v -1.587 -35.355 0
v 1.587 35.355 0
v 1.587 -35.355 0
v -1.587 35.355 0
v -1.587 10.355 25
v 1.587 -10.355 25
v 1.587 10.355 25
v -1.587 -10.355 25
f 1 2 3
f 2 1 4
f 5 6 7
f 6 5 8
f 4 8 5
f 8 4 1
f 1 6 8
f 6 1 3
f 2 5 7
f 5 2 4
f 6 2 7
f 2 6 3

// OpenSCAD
$fn = 72;



steelColor = [224/255, 223/255, 219/255];



edgeThickness = 3.175;
width = 120;
height = 366.67;
grillHeight = 73.33;
lensOffset = 153.33;
labelOffset = height - (edgeThickness + 8);
plateThickness = 3;
thickness = 75;
plateOffset = thickness - 5;
nozzleFudge = 0.4;


//translate([0, lensOffset, plateOffset + plateThickness + 3])
//button();

/*
translate([0, edgeThickness, plateOffset])
grill();
*/

/*
intersection()
{
    difference()
    {
        translate([0, grillHeight + (edgeThickness * 2), plateOffset])
        plate();
        
        union()
        {
            translate([0, lensOffset, 6.25])
            buttonMask();
            
            translate([0, labelOffset, plateOffset + plateThickness])
            label();
        }
    }
    
    translate([0, 80 + edgeThickness*2 + grillHeight + 140, 0])
    cube([200, 160, 200], center=true);
}
*/

//translate([0, labelOffset, plateOffset + plateThickness])
//label();

/*
translate([0, edgeThickness/2, 0])
difference()
{
    edgeWidth = width - (edgeThickness * 2);
    supportHeight = plateOffset + nozzleFudge;
    
    rotate([90, 0, 0])
    horizontalEdge(holeWidth = 16);
    
    union()
    {
        translate([-(edgeThickness + nozzleFudge)/2 + edgeWidth/2, -supportHeight/2, edgeThickness/2 - nozzleFudge*1.5/2])
        cube([edgeThickness + nozzleFudge, supportHeight, nozzleFudge*1.5 + .01], center=true);
        
        translate([-(-(edgeThickness + nozzleFudge)/2 + edgeWidth/2), -supportHeight/2, edgeThickness/2 - nozzleFudge*1.5/2])
        cube([edgeThickness + nozzleFudge, supportHeight, nozzleFudge*1.5 + .01], center=true);
        
        
        translate([-(-(edgeThickness + nozzleFudge)/2 + edgeWidth/2), -supportHeight/2, -edgeThickness/2 + nozzleFudge/2])
        cube([edgeThickness + nozzleFudge, supportHeight, nozzleFudge], center=true);
        
        translate([(-(edgeThickness + nozzleFudge)/2 + edgeWidth/2), -supportHeight/2, -edgeThickness/2 + nozzleFudge/2])
        cube([edgeThickness + nozzleFudge, supportHeight, nozzleFudge], center=true);
        
        
    }
}
*/

//translate([0, 3*edgeThickness/2 + grillHeight, 0])
//horizontalEdge();
//translate([0, height - edgeThickness/2, 0])
//horizontalEdge();

/*
intersection()
{
    union()
    {
        translate([-(width/2 - edgeThickness/2), height/2, 0])
        verticalEdge();

        mirror()
        {
            translate([-(width/2 - edgeThickness/2), height/2, 0])
            verticalEdge();
        }
    }
    
    translate([0, 375, 0])
    cube([200, 150, 200], center=true);
}
*/

corner();
module corner()
{
    difference()
    {
        rotate([45, 0, 0])
        cube([edgeThickness, 50, 50], center=true);
        
        union()
        {
            translate([0, 0, -50])
            cube([100, 100, 100], center=true);
            
            translate([0, 0, 50 + 25])
            cube([100, 100, 100], center=true);
        }
    }
}


module button()
{
    buttonDiameter = 87.8;
    bezelStartDiameter = 98.5;
    bezelEndDiameter = 92;
    bezelHeight = 6.5;
    
    union()
    {
        color("black")
        cylinder(d=buttonDiameter, h=10, center=true);
        
        scale([1, 1, .5])
        difference()
        {
            color("red")
            sphere(d=buttonDiameter, center=true);
            
            translate([0, 0, -75])
            cube([150, 150, 150], center=true);
        }
        
        cylinder(d1=bezelStartDiameter, d2=bezelEndDiameter, h=bezelHeight, center=true);
    }
}

module buttonMask()
{
    buttonDiameter = 87.8;
    notchRadius = 3;
    cylinder(d=buttonDiameter + nozzleFudge, h=50, center=true);
    
    translate([0, buttonDiameter/2, 0])
    cylinder(r=notchRadius + nozzleFudge, h=50, center=true);
    
    translate([0, -buttonDiameter/2, 0])
    cylinder(r=notchRadius + nozzleFudge, h=50, center=true);
}

module horizontalEdge(holeWidth)
{
    edgeWidth = width - (edgeThickness * 2);
    edgeLength = edgeThickness;
    edgeHeight = thickness;
    
    color(steelColor)
    translate([0, 0, edgeHeight/2])
    difference()
    {
        cube([edgeWidth, edgeLength, edgeHeight], center=true);
        
        rotate([90, 0, 0])
        cylinder(d=holeWidth, h=edgeThickness*2, center=true);
    }
}

module verticalEdge()
{
    edgeWidth = edgeThickness;
    edgeLength = height;
    edgeHeight = thickness;
    
    supportHeight = plateOffset;
    
    color(steelColor)
    translate([0, 0, edgeHeight/2])
    cube([edgeWidth, edgeLength, edgeHeight], center=true);
        
    // Supports for assembly
    translate([edgeThickness, 3*edgeThickness/2 - edgeLength/2, supportHeight/2])
    cube([edgeThickness, edgeThickness, supportHeight], center=true);
    
    translate([edgeThickness, edgeThickness/2 - edgeLength/2 + grillHeight, supportHeight/2])
    cube([edgeThickness, edgeThickness, supportHeight], center=true);
    
    translate([edgeThickness, 5*edgeThickness/2 - edgeLength/2 + grillHeight, supportHeight/2])
    cube([edgeThickness, edgeThickness, supportHeight], center=true);
    
    translate([edgeThickness, 0, supportHeight/2])
    cube([edgeThickness, edgeThickness, supportHeight], center=true);
    
    translate([edgeThickness, edgeLength/4, supportHeight/2])
    cube([edgeThickness, edgeThickness, supportHeight], center=true);
    
    translate([edgeThickness, -3*edgeThickness/2 + edgeLength/2, supportHeight/2])
    cube([edgeThickness, edgeThickness, supportHeight], center=true);
}

module grill()
{
    numX = 22;
    numY = 18;
    xRange = (numX - 1) / 2;
    yRange = (numY - 1) / 2;
    holeWidth = 2;
    spacingX = 5;
    spacingY = 4;
    
    grillWidth = width - (edgeThickness * 2);
    
    difference()
    {
        color(steelColor)
        translate([0, grillHeight/2, 1.5])
        cube([grillWidth, grillHeight, plateThickness], center=true);
        
        color(steelColor)
        translate([0, grillHeight/2, 1.5])
        for (y = [-yRange:1:yRange])
        {
            render()
            for (x = [-xRange:1:xRange])
            {
                //render()
                translate([x * spacingX, y * spacingY, 0])
                cylinder(d=holeWidth, h=5, center=true);
            }
        } 
    }
}

module plate()
{
    plateHeight = height - (grillHeight + (edgeThickness * 3));
    plateWidth = width - (edgeThickness * 2);
    
    color("black")
    translate([0, plateHeight/2, 1.5])
    cube([plateWidth, plateHeight, plateThickness], center=true);
}

module label()
{
    labelWidth = 92.5;
    labelHeight = 18.5;
    labelThickness = .25;
    
    color("turquoise")
    translate([0, -labelHeight/2, -labelThickness/2])
    cube([labelWidth, labelHeight, labelThickness], center=true);
}
